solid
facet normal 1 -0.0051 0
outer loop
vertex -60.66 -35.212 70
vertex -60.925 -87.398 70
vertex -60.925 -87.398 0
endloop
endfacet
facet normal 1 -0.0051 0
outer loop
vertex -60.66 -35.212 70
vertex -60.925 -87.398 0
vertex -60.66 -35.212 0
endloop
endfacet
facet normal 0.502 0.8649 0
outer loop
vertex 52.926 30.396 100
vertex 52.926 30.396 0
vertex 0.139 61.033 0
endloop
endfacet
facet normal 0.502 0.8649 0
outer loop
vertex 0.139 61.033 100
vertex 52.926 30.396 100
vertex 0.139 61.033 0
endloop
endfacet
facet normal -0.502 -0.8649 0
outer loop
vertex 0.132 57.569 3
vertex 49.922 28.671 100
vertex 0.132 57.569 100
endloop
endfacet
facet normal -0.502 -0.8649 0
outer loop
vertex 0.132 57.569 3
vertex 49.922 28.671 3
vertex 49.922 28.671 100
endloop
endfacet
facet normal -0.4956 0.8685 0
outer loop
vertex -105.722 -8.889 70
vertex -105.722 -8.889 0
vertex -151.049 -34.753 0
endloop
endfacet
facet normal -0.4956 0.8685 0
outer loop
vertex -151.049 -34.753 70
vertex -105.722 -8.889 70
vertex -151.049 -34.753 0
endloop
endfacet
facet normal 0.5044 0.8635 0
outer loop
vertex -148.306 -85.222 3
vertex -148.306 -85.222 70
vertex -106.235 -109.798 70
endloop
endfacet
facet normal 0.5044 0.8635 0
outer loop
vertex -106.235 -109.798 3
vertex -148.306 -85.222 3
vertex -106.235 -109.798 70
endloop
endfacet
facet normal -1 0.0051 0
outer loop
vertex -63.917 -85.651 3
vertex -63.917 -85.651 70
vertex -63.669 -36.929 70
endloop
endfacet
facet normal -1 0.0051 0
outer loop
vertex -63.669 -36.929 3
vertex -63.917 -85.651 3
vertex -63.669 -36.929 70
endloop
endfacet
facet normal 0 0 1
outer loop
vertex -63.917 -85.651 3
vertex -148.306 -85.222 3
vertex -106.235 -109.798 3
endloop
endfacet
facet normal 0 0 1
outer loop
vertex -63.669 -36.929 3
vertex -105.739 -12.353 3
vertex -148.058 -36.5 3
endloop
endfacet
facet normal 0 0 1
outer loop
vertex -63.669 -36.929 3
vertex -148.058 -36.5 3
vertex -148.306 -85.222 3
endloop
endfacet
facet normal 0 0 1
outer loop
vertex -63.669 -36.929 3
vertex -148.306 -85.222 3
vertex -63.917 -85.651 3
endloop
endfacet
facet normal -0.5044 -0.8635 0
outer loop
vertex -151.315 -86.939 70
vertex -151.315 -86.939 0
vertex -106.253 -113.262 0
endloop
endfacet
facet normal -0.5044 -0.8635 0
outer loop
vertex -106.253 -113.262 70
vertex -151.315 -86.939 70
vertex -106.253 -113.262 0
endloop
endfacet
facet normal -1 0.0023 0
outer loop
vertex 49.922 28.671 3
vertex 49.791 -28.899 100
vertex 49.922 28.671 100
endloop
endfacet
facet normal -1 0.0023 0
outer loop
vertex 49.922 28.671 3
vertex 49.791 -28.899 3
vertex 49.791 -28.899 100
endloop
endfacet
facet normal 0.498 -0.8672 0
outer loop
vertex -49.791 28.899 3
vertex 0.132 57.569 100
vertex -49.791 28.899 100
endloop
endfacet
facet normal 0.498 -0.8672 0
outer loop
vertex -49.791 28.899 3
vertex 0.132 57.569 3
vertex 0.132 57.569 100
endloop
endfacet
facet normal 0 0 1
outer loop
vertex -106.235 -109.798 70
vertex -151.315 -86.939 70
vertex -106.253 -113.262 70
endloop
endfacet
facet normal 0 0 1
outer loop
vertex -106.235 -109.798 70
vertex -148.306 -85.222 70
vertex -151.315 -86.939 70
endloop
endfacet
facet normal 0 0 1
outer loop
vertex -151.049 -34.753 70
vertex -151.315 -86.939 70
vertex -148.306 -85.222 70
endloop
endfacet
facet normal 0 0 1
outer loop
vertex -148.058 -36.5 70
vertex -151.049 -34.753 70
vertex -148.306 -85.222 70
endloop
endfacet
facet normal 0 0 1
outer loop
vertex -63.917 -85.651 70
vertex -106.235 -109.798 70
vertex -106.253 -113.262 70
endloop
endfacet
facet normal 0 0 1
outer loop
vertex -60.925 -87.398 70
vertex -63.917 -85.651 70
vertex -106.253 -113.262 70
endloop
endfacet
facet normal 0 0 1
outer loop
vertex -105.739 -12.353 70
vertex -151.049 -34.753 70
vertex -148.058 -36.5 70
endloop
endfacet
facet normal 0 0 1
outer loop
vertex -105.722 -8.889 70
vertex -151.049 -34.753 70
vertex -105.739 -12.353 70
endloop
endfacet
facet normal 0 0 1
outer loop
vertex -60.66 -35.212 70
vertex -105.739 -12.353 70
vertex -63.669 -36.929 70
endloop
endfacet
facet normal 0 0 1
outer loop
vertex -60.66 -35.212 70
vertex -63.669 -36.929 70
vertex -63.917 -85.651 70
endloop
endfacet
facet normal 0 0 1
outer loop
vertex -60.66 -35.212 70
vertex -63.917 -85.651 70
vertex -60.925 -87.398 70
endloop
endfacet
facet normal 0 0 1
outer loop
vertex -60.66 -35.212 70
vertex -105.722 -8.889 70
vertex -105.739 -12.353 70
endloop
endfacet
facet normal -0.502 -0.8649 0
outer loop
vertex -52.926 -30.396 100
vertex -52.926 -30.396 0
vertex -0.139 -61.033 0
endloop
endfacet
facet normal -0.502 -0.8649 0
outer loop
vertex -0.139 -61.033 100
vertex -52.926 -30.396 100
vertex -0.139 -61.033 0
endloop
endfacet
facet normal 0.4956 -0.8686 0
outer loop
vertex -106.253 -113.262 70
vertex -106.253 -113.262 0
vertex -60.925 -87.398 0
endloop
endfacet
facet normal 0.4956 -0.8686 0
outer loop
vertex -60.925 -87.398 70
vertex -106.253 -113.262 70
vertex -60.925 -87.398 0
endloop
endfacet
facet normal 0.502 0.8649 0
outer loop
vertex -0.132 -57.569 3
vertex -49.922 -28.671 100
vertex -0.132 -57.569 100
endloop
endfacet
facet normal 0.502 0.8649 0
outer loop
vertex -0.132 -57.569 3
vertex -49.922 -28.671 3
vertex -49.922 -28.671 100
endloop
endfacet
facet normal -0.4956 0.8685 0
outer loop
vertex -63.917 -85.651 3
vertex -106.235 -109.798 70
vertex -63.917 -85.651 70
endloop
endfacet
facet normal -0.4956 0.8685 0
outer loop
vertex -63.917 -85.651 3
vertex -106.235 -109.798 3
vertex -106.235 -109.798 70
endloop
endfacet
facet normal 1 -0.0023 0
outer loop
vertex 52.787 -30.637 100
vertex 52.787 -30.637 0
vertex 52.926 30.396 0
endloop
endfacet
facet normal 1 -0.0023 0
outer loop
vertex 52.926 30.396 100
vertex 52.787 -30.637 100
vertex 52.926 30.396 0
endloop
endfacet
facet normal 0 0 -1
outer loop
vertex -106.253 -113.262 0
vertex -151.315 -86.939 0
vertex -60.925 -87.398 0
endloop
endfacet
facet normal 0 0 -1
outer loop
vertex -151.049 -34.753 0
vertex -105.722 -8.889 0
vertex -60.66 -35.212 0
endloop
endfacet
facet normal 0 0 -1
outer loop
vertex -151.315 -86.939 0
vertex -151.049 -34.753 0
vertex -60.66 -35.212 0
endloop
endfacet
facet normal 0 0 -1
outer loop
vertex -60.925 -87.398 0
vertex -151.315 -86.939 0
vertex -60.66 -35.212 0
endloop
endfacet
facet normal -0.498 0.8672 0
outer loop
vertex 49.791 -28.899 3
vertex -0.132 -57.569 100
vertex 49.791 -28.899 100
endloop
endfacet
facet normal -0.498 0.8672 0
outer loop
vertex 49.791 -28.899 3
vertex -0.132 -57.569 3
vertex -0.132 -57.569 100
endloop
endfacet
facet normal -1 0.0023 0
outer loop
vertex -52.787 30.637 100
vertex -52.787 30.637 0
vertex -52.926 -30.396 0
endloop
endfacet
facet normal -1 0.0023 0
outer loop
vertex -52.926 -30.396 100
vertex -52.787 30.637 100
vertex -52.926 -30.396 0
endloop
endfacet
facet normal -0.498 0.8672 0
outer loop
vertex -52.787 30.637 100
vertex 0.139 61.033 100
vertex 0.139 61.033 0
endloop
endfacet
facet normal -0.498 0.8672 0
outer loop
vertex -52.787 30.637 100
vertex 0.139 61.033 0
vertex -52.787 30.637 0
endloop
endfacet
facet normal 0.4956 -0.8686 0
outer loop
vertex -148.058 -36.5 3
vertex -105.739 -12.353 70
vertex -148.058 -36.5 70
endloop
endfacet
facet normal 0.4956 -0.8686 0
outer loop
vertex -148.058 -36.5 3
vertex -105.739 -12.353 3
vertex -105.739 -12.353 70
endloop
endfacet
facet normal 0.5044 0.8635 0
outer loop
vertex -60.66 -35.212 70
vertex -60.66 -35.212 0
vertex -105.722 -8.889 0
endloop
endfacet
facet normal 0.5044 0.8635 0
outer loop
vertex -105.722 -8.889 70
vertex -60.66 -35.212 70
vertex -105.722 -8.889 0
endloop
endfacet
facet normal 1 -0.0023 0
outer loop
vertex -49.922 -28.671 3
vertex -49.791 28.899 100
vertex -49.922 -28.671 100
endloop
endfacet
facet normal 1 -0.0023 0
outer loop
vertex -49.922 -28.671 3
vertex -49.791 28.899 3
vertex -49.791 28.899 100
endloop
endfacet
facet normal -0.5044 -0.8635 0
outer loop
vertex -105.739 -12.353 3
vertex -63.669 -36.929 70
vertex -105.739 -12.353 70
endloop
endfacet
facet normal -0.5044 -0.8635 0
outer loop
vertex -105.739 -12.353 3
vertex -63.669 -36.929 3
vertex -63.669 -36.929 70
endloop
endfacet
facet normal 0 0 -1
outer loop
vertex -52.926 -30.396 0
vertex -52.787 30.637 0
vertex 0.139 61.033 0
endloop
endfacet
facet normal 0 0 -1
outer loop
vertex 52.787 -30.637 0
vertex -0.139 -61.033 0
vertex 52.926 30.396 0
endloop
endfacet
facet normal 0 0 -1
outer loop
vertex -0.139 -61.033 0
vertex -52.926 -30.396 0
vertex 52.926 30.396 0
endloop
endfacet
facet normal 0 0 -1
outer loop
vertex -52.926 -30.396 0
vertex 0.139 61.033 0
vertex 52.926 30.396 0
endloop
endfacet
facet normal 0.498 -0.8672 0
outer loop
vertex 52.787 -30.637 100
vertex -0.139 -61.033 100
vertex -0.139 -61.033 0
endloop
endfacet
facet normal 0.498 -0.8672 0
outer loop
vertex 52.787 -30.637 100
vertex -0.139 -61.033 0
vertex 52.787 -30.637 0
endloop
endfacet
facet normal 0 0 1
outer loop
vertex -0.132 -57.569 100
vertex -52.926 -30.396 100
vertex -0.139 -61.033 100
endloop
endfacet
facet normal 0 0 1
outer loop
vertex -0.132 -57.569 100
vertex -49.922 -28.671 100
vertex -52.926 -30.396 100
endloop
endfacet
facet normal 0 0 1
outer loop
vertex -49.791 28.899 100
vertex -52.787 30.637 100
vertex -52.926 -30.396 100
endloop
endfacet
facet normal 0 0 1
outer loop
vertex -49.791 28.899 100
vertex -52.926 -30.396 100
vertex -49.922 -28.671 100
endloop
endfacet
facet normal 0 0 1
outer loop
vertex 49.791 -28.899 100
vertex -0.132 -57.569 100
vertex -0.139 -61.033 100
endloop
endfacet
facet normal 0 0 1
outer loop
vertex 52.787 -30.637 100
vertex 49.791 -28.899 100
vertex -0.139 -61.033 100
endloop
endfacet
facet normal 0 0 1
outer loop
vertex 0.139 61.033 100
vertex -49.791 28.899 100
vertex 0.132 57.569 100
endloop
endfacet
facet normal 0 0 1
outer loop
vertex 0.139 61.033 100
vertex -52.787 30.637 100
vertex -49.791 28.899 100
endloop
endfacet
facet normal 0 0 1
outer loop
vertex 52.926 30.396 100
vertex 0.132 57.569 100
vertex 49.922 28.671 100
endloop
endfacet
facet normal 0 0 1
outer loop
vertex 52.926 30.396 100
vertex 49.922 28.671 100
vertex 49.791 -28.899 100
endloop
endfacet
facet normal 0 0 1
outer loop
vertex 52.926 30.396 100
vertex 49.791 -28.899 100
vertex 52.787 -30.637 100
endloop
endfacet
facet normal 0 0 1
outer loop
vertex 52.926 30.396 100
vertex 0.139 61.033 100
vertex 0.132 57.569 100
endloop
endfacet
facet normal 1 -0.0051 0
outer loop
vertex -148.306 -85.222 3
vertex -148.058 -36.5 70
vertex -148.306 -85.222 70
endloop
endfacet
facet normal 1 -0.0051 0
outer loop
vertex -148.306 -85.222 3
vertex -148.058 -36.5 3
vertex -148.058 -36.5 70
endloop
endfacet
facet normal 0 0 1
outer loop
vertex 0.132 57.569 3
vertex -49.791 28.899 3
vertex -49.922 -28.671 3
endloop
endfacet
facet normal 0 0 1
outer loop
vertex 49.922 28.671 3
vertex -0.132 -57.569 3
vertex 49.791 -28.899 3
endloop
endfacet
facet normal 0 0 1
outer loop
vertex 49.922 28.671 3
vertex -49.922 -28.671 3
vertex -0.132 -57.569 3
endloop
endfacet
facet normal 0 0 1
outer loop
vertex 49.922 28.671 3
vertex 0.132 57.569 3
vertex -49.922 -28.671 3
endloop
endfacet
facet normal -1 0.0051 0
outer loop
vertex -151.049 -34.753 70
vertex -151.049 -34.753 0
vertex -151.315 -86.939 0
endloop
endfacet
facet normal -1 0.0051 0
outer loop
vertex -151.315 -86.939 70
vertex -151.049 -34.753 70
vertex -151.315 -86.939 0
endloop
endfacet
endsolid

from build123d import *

# Parameters (mm, degrees)
F1_DEPTH = 100
F2_DEPTH = 70
F3_T     = -3
F4_T     = -3


with BuildPart() as f1:
    # F0 (on Top) → F1 (new body)
    with BuildSketch(Plane.XY):
        Polygon((-0.139473, -61.033414), (52.786751, -30.637494), (52.926223, 30.39592), (0.139473, 61.033414), (-52.786751, 30.637494), (-52.926223, -30.39592), align=None)
    extrude(amount=F1_DEPTH)

    # F4
    f4_openings = [f1.faces().sort_by_distance(p)[0] for p in [
        (0, 0, 100),
    ]]
    offset(amount=F4_T, openings=f4_openings)


with BuildPart() as f2:
    # F0 (on Top) → F2 (new body)
    with BuildSketch(Plane.XY):
        Polygon((-106.252715, -113.261599), (-60.925469, -87.398407), (-60.660028, -35.212264), (-105.721832, -8.889314), (-151.049077, -34.752506), (-151.314519, -86.938648), align=None)
    extrude(amount=F2_DEPTH)

    # F3
    f3_openings = [f2.faces().sort_by_distance(p)[0] for p in [
        (-105.987273, -61.075456, 70),
    ]]
    offset(amount=F3_T, openings=f3_openings)


solid = Compound([f1.part, f2.part])
